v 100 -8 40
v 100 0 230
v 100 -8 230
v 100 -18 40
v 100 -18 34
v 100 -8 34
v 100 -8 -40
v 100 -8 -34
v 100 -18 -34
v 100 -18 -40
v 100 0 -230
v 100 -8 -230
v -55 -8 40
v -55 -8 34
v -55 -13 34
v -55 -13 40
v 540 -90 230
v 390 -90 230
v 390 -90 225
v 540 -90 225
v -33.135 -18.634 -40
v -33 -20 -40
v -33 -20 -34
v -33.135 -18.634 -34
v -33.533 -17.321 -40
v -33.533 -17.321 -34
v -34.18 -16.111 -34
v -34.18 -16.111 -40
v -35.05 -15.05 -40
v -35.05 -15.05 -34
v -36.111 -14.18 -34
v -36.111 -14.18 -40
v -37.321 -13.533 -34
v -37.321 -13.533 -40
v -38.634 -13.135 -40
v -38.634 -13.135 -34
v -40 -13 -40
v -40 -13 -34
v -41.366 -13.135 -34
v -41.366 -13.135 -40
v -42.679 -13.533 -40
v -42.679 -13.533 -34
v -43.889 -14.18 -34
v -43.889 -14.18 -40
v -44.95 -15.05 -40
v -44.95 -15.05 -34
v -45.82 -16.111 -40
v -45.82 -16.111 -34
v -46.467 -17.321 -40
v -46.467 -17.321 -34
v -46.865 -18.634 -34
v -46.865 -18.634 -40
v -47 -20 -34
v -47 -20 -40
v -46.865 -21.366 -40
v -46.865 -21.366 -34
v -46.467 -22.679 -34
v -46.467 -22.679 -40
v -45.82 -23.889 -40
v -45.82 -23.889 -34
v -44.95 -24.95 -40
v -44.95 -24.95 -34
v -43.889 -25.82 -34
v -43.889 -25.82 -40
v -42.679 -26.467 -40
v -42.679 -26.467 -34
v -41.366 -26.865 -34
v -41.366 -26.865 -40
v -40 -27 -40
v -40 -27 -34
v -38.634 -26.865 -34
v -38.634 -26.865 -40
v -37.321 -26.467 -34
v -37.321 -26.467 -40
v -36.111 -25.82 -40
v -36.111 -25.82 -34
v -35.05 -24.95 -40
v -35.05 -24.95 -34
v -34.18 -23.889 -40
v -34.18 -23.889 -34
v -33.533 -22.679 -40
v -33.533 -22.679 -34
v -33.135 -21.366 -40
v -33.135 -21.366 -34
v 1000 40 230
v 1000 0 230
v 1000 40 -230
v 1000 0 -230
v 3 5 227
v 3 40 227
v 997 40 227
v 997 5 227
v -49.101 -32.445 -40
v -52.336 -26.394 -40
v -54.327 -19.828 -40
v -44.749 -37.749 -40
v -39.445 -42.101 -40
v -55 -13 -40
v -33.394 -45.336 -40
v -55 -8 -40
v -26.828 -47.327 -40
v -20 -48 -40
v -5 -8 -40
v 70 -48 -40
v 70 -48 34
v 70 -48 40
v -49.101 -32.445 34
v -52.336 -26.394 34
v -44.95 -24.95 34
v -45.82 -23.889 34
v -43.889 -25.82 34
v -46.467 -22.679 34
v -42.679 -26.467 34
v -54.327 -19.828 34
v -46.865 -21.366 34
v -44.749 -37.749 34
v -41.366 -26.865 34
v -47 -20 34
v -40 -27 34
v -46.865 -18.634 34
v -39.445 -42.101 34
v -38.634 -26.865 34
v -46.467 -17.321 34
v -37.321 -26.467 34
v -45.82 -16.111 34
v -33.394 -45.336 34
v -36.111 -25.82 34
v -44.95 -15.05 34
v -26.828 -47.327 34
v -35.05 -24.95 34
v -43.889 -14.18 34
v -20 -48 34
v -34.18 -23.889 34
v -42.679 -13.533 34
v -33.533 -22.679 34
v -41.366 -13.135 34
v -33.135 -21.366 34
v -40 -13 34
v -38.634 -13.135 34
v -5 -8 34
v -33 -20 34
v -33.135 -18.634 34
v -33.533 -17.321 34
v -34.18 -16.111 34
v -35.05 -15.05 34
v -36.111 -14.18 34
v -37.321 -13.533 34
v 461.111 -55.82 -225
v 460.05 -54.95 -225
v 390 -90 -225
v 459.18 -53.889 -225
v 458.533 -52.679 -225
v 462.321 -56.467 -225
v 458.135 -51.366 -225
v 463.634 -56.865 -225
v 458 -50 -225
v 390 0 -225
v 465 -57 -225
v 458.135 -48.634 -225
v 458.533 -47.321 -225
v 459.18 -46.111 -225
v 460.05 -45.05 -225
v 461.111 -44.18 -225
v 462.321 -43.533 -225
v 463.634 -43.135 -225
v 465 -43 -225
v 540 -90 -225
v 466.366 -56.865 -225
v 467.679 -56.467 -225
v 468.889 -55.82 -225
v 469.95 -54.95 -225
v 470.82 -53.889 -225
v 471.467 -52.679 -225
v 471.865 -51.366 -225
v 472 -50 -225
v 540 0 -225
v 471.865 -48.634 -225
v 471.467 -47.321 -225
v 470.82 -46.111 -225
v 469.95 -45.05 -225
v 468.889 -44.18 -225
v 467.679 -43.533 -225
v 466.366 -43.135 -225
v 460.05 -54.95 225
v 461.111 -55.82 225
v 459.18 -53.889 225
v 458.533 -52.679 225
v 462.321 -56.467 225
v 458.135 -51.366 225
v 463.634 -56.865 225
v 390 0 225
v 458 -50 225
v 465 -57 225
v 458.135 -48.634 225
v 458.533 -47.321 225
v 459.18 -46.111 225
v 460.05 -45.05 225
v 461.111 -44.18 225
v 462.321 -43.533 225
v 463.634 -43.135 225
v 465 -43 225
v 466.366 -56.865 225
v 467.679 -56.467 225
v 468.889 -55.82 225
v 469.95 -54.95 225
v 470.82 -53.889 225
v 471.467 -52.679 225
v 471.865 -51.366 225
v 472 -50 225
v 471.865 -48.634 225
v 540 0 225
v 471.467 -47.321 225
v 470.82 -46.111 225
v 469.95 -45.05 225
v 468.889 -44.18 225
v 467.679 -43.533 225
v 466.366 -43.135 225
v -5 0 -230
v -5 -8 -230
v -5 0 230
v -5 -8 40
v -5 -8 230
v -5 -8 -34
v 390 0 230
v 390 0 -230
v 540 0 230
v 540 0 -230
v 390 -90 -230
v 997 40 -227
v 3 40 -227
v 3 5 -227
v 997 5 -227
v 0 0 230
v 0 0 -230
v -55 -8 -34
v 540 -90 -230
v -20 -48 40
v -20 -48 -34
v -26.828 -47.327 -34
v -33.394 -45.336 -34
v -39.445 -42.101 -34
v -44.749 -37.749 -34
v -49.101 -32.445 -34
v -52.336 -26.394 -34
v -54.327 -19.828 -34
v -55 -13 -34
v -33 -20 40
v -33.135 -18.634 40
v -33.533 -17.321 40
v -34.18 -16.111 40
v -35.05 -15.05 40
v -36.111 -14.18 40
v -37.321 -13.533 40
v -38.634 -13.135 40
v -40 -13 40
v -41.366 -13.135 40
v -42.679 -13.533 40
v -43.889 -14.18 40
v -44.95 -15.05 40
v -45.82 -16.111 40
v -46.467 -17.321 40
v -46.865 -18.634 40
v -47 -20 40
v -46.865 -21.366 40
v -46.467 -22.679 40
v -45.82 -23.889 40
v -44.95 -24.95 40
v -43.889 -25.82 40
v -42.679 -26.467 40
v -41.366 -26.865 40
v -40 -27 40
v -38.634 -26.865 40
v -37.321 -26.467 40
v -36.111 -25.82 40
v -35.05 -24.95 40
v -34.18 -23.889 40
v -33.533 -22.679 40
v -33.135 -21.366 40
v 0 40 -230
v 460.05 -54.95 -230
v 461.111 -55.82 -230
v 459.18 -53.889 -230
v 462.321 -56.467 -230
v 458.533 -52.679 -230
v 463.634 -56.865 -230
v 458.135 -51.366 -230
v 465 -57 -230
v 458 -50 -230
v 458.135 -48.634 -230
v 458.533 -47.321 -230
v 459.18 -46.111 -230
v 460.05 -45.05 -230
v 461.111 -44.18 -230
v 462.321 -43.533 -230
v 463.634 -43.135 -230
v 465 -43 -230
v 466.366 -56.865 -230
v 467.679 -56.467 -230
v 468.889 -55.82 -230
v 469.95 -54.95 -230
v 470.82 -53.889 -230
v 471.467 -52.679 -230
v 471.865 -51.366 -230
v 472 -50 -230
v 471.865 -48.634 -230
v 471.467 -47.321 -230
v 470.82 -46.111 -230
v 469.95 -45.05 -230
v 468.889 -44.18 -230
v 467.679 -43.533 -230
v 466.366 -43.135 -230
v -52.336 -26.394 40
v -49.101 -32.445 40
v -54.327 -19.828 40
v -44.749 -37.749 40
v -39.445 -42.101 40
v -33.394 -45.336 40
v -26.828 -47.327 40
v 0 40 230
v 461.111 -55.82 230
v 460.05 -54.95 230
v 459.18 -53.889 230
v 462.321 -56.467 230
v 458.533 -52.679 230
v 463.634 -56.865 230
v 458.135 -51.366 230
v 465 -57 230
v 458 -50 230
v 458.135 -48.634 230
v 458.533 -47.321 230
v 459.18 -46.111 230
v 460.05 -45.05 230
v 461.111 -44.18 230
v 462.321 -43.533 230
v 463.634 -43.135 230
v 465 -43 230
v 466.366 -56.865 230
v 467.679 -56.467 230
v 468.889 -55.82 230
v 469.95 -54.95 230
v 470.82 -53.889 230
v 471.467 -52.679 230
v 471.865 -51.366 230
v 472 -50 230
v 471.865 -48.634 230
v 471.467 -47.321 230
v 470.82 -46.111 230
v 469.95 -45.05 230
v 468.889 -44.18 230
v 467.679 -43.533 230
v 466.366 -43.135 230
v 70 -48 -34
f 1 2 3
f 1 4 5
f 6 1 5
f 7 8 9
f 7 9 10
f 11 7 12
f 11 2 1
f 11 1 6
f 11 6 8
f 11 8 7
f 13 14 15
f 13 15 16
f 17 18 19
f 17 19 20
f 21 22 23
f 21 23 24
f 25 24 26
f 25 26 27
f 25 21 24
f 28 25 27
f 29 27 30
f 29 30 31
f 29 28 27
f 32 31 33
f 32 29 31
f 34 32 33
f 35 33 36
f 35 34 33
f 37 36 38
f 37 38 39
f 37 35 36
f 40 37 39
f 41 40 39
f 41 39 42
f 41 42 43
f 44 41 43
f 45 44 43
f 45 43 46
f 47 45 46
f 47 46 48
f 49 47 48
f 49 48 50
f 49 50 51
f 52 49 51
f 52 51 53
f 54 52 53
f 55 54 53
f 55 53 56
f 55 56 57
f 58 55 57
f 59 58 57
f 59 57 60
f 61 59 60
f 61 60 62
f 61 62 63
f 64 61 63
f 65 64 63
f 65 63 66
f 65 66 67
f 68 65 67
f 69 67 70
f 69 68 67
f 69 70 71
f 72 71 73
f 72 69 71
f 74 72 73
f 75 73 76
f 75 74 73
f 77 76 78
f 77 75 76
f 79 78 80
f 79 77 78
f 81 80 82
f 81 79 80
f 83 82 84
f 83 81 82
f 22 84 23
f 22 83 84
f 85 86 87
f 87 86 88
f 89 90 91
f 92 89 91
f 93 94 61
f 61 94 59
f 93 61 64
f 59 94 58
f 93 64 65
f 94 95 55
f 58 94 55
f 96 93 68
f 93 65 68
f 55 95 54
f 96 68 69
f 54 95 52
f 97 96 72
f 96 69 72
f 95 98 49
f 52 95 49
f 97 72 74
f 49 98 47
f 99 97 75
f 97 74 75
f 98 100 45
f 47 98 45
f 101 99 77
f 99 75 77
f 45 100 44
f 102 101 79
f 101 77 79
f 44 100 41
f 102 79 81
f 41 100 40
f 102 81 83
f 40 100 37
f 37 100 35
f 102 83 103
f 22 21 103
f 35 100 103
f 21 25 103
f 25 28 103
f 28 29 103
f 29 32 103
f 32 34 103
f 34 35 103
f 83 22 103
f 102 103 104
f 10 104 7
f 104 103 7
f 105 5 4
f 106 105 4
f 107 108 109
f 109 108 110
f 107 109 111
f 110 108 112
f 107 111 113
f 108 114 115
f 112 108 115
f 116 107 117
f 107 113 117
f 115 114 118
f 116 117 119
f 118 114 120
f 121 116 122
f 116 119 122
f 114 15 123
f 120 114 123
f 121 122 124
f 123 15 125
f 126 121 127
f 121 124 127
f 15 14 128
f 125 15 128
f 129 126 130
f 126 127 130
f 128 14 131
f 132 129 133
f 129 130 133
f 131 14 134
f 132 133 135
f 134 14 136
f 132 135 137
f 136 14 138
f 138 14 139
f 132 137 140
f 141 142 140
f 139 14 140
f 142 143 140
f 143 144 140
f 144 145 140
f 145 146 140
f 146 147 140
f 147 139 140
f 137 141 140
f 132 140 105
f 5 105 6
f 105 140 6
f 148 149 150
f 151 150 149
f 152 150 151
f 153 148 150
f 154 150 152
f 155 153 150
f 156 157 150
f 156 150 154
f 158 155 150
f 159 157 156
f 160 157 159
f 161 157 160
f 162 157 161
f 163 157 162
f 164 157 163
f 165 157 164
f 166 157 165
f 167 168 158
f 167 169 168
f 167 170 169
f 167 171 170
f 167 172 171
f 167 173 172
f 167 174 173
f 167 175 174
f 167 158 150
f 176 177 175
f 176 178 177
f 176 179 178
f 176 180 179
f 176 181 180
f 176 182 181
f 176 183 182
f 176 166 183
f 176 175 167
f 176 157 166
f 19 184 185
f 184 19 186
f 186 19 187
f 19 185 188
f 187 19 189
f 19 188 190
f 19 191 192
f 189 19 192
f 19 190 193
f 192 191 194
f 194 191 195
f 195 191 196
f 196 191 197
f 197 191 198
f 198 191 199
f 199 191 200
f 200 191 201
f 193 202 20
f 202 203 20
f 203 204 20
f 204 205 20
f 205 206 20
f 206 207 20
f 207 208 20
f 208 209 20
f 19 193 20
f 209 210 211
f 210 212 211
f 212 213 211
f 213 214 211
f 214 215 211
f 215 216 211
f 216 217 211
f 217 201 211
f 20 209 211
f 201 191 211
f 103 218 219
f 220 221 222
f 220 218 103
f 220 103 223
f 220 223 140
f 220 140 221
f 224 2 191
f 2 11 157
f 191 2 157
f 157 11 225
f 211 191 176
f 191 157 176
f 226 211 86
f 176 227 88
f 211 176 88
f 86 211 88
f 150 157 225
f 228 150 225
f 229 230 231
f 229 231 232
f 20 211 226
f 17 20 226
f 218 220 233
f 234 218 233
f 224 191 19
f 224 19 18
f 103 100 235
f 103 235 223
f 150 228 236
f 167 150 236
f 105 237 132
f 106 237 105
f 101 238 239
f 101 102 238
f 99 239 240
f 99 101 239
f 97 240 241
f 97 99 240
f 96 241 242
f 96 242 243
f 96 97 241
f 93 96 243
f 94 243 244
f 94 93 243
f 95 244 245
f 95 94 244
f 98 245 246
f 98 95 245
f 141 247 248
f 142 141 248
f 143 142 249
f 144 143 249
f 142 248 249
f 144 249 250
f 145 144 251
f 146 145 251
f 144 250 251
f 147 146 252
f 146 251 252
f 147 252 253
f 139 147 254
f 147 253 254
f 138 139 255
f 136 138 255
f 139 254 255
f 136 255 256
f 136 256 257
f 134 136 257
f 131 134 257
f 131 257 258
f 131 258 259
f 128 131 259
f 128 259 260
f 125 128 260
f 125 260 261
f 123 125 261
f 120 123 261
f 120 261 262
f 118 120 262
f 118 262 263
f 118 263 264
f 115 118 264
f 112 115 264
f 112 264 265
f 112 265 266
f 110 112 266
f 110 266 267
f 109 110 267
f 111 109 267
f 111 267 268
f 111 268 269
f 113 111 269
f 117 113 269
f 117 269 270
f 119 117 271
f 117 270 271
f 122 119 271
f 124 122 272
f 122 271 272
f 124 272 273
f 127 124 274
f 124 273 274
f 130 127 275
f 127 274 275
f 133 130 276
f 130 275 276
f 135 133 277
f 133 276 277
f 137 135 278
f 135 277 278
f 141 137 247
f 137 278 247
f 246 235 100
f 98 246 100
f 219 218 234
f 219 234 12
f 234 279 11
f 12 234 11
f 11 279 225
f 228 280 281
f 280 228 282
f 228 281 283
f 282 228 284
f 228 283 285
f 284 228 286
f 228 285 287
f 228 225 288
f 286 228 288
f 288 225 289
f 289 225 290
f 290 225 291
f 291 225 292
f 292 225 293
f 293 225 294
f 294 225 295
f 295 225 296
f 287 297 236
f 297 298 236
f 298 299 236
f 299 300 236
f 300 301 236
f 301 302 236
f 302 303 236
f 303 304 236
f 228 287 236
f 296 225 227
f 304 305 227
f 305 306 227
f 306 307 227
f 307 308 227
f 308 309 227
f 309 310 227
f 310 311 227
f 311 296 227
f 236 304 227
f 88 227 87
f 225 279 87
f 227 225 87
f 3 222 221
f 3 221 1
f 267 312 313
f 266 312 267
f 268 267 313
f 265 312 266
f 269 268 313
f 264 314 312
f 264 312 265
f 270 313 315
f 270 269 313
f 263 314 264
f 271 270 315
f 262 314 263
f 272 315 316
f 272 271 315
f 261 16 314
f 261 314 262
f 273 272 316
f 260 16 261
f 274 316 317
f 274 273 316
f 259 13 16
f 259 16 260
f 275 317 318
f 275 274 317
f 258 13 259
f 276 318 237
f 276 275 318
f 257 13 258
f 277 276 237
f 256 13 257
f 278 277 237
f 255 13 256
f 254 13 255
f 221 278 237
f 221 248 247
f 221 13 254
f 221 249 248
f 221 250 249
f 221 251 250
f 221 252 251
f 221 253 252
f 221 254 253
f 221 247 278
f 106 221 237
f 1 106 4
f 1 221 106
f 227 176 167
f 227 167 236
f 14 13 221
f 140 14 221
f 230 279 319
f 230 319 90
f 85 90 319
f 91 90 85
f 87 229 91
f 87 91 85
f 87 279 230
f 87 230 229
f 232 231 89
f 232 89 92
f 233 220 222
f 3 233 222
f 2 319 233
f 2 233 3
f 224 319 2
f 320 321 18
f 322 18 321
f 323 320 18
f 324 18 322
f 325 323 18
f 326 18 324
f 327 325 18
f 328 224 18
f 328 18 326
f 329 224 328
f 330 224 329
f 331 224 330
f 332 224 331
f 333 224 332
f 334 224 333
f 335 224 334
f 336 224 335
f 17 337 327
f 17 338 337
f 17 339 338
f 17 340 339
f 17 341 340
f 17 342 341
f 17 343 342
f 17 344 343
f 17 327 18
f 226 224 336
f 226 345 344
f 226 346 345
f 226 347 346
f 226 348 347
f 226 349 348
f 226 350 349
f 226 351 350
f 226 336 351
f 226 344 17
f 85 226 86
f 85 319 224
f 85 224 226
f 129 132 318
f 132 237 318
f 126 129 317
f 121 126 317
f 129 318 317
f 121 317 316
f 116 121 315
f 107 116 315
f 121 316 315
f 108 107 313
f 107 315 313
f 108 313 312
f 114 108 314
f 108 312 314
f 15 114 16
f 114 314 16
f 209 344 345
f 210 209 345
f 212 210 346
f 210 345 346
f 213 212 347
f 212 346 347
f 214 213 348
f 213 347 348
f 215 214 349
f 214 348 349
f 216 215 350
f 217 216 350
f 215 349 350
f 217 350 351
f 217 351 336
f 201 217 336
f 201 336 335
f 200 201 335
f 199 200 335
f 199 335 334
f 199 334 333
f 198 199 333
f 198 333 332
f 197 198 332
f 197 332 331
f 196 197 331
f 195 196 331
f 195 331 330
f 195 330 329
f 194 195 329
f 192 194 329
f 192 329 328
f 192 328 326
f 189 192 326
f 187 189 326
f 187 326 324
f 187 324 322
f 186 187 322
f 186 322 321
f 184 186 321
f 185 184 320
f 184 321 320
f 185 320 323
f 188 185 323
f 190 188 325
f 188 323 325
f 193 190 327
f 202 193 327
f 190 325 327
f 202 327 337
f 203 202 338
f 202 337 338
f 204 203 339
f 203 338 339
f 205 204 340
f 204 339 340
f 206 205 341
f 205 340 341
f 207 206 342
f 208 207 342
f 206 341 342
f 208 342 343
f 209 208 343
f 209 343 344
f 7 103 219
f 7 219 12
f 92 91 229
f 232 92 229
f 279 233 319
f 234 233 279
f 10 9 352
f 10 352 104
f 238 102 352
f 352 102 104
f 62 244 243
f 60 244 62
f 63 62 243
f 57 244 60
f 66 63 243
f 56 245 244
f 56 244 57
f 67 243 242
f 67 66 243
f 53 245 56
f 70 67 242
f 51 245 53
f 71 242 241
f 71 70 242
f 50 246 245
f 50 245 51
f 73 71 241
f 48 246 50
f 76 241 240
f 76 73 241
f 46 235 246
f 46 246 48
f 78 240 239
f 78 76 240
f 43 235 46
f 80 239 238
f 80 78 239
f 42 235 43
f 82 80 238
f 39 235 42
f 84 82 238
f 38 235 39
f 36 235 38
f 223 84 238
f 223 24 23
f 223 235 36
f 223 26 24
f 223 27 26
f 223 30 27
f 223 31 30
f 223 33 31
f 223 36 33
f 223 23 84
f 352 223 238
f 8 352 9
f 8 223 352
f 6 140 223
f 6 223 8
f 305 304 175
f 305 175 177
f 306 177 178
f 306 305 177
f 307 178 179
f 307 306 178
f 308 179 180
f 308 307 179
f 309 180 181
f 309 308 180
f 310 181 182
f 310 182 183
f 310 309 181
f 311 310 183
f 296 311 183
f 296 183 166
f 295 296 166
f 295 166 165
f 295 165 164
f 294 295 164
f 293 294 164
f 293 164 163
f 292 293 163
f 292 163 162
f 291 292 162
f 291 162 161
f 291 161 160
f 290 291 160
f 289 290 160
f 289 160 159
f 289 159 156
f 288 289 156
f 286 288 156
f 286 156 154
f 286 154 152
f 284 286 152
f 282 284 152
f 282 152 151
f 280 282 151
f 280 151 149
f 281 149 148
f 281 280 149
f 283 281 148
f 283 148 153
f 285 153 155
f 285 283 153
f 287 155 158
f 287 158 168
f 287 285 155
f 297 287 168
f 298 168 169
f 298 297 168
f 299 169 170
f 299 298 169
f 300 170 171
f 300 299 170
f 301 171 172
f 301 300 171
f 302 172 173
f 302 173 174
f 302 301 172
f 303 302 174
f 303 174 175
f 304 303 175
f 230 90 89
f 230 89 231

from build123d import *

# Parameters (mm, degrees)
ESQUISSE2_W                  = 1000
ESQUISSE2_H                  = 460
BOSS_EXTRU_1_DEPTH           = 40
ESQUISSE3_W                  = 150
ESQUISSE3_H                  = 5
BOSS_EXTRU_2_DEPTH           = 90
ENL_V_MAT_EXTRU_1_REACH      = 1106.4
ESQUISSE4_R                  = 7
ESQUISSE5_W                  = 105
ESQUISSE5_H                  = 460
BOSS_EXTRU_3_DEPTH           = 8
ESQUISSE6_W                  = 155
ESQUISSE6_H                  = 6
BOSS_EXTRU_4_DEPTH           = 40
CHANFREIN1_SIZE              = 30
CONG_1_R                     = 35
ENL_V_MAT_EXTRU_2_REACH      = 1041.711
ESQUISSE7_R                  = 7
ESQUISSE8_W                  = 994
ESQUISSE8_H                  = 454
ENL_V_MAT_EXTRU_3_DEPTH      = 35
CHANFREIN1_OF_SYM_TRIE1_SIZE = 30
CONG_1_OF_SYM_TRIE1_R        = 35


with BuildPart() as part:
    # Esquisse2 → Boss.-Extru.1 (new body)
    with BuildSketch(Plane(origin=(0, 0, 0), x_dir=(1, 0, 0), z_dir=(0, 1, 0))):
        with Locations((500, 0)):
            Rectangle(ESQUISSE2_W, ESQUISSE2_H)
    extrude(amount=BOSS_EXTRU_1_DEPTH)

    # Esquisse3 → Boss.-Extru.2 (add)
    with BuildSketch(Plane.XZ):
        with Locations((465, 227.5)):
            Rectangle(ESQUISSE3_W, ESQUISSE3_H)
    boss_extru_2 = extrude(amount=BOSS_EXTRU_2_DEPTH)

    # Esquisse4 → Enlèv. mat.-Extru.1 (cut, up to next)
    with BuildSketch(Plane.XY.offset(230), mode=Mode.PRIVATE) as enl_v_mat_extru_1_sk1:
        with Locations((465, -50)):
            Circle(ESQUISSE4_R)
    enl_v_mat_extru_1_tool1 = extrude(enl_v_mat_extru_1_sk1.sketch, amount=-ENL_V_MAT_EXTRU_1_REACH, mode=Mode.PRIVATE) & part.part
    enl_v_mat_extru_1 = enl_v_mat_extru_1_tool1.solids().sort_by_distance((465, -50, 230))[0]
    add(enl_v_mat_extru_1, mode=Mode.SUBTRACT)

    # Esquisse5 → Boss.-Extru.3 (add)
    with BuildSketch(Plane.XZ):
        with Locations((47.5, 0)):
            Rectangle(ESQUISSE5_W, ESQUISSE5_H)
    extrude(amount=BOSS_EXTRU_3_DEPTH)

    # Esquisse6 → Boss.-Extru.4 (add)
    with BuildSketch(Plane.XZ.offset(8)):
        with Locations((22.5, 37)):
            Rectangle(ESQUISSE6_W, ESQUISSE6_H)
    boss_extru_4 = extrude(amount=BOSS_EXTRU_4_DEPTH)

    # Chanfrein1
    chanfrein1_edges = [part.edges().sort_by_distance(p)[0] for p in [
        (100, -48, 37),
    ]]
    chamfer(chanfrein1_edges, length=CHANFREIN1_SIZE)

    # Congé1
    cong_1_edges = [part.edges().sort_by_distance(p)[0] for p in [
        (-55, -48, 37),
    ]]
    fillet(cong_1_edges, radius=CONG_1_R)

    # Esquisse7 → Enlèv. mat.-Extru.2 (cut, up to next)
    with BuildSketch(Plane.XY.offset(40), mode=Mode.PRIVATE) as enl_v_mat_extru_2_sk1:
        with Locations((-40, -20)):
            Circle(ESQUISSE7_R)
    enl_v_mat_extru_2_tool1 = extrude(enl_v_mat_extru_2_sk1.sketch, amount=-ENL_V_MAT_EXTRU_2_REACH, mode=Mode.PRIVATE) & part.part
    enl_v_mat_extru_2 = enl_v_mat_extru_2_tool1.solids().sort_by_distance((-40, -20, 40))[0]
    add(enl_v_mat_extru_2, mode=Mode.SUBTRACT)

    # Esquisse8 → Enlèv. mat.-Extru.3 (cut)
    with BuildSketch(Plane(origin=(0, 40, 0), x_dir=(1, 0, 0), z_dir=(0, 1, 0))):
        with Locations((500, 0)):
            Rectangle(ESQUISSE8_W, ESQUISSE8_H)
    extrude(amount=-ENL_V_MAT_EXTRU_3_DEPTH, mode=Mode.SUBTRACT)

    # Symétrie1: Boss.-Extru.2, Enlèv. mat.-Extru.1, Boss.-Extru.4, Enlèv. mat.-Extru.2 across plane
    add(boss_extru_2.mirror(Plane(origin=(0, 0, 0), x_dir=(1, 0, 0), z_dir=(0, 0, -1))))
    add(enl_v_mat_extru_1.mirror(Plane(origin=(0, 0, 0), x_dir=(1, 0, 0), z_dir=(0, 0, -1))), mode=Mode.SUBTRACT)
    add(boss_extru_4.mirror(Plane(origin=(0, 0, 0), x_dir=(1, 0, 0), z_dir=(0, 0, -1))))
    add(enl_v_mat_extru_2.mirror(Plane(origin=(0, 0, 0), x_dir=(1, 0, 0), z_dir=(0, 0, -1))), mode=Mode.SUBTRACT)

    # Chanfrein1 of Symétrie1
    chanfrein1_of_sym_trie1_edges = [part.edges().sort_by_distance(p)[0] for p in [
        (100, -48, -37),
    ]]
    chamfer(chanfrein1_of_sym_trie1_edges, length=CHANFREIN1_OF_SYM_TRIE1_SIZE)

    # Congé1 of Symétrie1
    cong_1_of_sym_trie1_edges = [part.edges().sort_by_distance(p)[0] for p in [
        (-55, -48, -37),
    ]]
    fillet(cong_1_of_sym_trie1_edges, radius=CONG_1_OF_SYM_TRIE1_R)


solid = part.part
